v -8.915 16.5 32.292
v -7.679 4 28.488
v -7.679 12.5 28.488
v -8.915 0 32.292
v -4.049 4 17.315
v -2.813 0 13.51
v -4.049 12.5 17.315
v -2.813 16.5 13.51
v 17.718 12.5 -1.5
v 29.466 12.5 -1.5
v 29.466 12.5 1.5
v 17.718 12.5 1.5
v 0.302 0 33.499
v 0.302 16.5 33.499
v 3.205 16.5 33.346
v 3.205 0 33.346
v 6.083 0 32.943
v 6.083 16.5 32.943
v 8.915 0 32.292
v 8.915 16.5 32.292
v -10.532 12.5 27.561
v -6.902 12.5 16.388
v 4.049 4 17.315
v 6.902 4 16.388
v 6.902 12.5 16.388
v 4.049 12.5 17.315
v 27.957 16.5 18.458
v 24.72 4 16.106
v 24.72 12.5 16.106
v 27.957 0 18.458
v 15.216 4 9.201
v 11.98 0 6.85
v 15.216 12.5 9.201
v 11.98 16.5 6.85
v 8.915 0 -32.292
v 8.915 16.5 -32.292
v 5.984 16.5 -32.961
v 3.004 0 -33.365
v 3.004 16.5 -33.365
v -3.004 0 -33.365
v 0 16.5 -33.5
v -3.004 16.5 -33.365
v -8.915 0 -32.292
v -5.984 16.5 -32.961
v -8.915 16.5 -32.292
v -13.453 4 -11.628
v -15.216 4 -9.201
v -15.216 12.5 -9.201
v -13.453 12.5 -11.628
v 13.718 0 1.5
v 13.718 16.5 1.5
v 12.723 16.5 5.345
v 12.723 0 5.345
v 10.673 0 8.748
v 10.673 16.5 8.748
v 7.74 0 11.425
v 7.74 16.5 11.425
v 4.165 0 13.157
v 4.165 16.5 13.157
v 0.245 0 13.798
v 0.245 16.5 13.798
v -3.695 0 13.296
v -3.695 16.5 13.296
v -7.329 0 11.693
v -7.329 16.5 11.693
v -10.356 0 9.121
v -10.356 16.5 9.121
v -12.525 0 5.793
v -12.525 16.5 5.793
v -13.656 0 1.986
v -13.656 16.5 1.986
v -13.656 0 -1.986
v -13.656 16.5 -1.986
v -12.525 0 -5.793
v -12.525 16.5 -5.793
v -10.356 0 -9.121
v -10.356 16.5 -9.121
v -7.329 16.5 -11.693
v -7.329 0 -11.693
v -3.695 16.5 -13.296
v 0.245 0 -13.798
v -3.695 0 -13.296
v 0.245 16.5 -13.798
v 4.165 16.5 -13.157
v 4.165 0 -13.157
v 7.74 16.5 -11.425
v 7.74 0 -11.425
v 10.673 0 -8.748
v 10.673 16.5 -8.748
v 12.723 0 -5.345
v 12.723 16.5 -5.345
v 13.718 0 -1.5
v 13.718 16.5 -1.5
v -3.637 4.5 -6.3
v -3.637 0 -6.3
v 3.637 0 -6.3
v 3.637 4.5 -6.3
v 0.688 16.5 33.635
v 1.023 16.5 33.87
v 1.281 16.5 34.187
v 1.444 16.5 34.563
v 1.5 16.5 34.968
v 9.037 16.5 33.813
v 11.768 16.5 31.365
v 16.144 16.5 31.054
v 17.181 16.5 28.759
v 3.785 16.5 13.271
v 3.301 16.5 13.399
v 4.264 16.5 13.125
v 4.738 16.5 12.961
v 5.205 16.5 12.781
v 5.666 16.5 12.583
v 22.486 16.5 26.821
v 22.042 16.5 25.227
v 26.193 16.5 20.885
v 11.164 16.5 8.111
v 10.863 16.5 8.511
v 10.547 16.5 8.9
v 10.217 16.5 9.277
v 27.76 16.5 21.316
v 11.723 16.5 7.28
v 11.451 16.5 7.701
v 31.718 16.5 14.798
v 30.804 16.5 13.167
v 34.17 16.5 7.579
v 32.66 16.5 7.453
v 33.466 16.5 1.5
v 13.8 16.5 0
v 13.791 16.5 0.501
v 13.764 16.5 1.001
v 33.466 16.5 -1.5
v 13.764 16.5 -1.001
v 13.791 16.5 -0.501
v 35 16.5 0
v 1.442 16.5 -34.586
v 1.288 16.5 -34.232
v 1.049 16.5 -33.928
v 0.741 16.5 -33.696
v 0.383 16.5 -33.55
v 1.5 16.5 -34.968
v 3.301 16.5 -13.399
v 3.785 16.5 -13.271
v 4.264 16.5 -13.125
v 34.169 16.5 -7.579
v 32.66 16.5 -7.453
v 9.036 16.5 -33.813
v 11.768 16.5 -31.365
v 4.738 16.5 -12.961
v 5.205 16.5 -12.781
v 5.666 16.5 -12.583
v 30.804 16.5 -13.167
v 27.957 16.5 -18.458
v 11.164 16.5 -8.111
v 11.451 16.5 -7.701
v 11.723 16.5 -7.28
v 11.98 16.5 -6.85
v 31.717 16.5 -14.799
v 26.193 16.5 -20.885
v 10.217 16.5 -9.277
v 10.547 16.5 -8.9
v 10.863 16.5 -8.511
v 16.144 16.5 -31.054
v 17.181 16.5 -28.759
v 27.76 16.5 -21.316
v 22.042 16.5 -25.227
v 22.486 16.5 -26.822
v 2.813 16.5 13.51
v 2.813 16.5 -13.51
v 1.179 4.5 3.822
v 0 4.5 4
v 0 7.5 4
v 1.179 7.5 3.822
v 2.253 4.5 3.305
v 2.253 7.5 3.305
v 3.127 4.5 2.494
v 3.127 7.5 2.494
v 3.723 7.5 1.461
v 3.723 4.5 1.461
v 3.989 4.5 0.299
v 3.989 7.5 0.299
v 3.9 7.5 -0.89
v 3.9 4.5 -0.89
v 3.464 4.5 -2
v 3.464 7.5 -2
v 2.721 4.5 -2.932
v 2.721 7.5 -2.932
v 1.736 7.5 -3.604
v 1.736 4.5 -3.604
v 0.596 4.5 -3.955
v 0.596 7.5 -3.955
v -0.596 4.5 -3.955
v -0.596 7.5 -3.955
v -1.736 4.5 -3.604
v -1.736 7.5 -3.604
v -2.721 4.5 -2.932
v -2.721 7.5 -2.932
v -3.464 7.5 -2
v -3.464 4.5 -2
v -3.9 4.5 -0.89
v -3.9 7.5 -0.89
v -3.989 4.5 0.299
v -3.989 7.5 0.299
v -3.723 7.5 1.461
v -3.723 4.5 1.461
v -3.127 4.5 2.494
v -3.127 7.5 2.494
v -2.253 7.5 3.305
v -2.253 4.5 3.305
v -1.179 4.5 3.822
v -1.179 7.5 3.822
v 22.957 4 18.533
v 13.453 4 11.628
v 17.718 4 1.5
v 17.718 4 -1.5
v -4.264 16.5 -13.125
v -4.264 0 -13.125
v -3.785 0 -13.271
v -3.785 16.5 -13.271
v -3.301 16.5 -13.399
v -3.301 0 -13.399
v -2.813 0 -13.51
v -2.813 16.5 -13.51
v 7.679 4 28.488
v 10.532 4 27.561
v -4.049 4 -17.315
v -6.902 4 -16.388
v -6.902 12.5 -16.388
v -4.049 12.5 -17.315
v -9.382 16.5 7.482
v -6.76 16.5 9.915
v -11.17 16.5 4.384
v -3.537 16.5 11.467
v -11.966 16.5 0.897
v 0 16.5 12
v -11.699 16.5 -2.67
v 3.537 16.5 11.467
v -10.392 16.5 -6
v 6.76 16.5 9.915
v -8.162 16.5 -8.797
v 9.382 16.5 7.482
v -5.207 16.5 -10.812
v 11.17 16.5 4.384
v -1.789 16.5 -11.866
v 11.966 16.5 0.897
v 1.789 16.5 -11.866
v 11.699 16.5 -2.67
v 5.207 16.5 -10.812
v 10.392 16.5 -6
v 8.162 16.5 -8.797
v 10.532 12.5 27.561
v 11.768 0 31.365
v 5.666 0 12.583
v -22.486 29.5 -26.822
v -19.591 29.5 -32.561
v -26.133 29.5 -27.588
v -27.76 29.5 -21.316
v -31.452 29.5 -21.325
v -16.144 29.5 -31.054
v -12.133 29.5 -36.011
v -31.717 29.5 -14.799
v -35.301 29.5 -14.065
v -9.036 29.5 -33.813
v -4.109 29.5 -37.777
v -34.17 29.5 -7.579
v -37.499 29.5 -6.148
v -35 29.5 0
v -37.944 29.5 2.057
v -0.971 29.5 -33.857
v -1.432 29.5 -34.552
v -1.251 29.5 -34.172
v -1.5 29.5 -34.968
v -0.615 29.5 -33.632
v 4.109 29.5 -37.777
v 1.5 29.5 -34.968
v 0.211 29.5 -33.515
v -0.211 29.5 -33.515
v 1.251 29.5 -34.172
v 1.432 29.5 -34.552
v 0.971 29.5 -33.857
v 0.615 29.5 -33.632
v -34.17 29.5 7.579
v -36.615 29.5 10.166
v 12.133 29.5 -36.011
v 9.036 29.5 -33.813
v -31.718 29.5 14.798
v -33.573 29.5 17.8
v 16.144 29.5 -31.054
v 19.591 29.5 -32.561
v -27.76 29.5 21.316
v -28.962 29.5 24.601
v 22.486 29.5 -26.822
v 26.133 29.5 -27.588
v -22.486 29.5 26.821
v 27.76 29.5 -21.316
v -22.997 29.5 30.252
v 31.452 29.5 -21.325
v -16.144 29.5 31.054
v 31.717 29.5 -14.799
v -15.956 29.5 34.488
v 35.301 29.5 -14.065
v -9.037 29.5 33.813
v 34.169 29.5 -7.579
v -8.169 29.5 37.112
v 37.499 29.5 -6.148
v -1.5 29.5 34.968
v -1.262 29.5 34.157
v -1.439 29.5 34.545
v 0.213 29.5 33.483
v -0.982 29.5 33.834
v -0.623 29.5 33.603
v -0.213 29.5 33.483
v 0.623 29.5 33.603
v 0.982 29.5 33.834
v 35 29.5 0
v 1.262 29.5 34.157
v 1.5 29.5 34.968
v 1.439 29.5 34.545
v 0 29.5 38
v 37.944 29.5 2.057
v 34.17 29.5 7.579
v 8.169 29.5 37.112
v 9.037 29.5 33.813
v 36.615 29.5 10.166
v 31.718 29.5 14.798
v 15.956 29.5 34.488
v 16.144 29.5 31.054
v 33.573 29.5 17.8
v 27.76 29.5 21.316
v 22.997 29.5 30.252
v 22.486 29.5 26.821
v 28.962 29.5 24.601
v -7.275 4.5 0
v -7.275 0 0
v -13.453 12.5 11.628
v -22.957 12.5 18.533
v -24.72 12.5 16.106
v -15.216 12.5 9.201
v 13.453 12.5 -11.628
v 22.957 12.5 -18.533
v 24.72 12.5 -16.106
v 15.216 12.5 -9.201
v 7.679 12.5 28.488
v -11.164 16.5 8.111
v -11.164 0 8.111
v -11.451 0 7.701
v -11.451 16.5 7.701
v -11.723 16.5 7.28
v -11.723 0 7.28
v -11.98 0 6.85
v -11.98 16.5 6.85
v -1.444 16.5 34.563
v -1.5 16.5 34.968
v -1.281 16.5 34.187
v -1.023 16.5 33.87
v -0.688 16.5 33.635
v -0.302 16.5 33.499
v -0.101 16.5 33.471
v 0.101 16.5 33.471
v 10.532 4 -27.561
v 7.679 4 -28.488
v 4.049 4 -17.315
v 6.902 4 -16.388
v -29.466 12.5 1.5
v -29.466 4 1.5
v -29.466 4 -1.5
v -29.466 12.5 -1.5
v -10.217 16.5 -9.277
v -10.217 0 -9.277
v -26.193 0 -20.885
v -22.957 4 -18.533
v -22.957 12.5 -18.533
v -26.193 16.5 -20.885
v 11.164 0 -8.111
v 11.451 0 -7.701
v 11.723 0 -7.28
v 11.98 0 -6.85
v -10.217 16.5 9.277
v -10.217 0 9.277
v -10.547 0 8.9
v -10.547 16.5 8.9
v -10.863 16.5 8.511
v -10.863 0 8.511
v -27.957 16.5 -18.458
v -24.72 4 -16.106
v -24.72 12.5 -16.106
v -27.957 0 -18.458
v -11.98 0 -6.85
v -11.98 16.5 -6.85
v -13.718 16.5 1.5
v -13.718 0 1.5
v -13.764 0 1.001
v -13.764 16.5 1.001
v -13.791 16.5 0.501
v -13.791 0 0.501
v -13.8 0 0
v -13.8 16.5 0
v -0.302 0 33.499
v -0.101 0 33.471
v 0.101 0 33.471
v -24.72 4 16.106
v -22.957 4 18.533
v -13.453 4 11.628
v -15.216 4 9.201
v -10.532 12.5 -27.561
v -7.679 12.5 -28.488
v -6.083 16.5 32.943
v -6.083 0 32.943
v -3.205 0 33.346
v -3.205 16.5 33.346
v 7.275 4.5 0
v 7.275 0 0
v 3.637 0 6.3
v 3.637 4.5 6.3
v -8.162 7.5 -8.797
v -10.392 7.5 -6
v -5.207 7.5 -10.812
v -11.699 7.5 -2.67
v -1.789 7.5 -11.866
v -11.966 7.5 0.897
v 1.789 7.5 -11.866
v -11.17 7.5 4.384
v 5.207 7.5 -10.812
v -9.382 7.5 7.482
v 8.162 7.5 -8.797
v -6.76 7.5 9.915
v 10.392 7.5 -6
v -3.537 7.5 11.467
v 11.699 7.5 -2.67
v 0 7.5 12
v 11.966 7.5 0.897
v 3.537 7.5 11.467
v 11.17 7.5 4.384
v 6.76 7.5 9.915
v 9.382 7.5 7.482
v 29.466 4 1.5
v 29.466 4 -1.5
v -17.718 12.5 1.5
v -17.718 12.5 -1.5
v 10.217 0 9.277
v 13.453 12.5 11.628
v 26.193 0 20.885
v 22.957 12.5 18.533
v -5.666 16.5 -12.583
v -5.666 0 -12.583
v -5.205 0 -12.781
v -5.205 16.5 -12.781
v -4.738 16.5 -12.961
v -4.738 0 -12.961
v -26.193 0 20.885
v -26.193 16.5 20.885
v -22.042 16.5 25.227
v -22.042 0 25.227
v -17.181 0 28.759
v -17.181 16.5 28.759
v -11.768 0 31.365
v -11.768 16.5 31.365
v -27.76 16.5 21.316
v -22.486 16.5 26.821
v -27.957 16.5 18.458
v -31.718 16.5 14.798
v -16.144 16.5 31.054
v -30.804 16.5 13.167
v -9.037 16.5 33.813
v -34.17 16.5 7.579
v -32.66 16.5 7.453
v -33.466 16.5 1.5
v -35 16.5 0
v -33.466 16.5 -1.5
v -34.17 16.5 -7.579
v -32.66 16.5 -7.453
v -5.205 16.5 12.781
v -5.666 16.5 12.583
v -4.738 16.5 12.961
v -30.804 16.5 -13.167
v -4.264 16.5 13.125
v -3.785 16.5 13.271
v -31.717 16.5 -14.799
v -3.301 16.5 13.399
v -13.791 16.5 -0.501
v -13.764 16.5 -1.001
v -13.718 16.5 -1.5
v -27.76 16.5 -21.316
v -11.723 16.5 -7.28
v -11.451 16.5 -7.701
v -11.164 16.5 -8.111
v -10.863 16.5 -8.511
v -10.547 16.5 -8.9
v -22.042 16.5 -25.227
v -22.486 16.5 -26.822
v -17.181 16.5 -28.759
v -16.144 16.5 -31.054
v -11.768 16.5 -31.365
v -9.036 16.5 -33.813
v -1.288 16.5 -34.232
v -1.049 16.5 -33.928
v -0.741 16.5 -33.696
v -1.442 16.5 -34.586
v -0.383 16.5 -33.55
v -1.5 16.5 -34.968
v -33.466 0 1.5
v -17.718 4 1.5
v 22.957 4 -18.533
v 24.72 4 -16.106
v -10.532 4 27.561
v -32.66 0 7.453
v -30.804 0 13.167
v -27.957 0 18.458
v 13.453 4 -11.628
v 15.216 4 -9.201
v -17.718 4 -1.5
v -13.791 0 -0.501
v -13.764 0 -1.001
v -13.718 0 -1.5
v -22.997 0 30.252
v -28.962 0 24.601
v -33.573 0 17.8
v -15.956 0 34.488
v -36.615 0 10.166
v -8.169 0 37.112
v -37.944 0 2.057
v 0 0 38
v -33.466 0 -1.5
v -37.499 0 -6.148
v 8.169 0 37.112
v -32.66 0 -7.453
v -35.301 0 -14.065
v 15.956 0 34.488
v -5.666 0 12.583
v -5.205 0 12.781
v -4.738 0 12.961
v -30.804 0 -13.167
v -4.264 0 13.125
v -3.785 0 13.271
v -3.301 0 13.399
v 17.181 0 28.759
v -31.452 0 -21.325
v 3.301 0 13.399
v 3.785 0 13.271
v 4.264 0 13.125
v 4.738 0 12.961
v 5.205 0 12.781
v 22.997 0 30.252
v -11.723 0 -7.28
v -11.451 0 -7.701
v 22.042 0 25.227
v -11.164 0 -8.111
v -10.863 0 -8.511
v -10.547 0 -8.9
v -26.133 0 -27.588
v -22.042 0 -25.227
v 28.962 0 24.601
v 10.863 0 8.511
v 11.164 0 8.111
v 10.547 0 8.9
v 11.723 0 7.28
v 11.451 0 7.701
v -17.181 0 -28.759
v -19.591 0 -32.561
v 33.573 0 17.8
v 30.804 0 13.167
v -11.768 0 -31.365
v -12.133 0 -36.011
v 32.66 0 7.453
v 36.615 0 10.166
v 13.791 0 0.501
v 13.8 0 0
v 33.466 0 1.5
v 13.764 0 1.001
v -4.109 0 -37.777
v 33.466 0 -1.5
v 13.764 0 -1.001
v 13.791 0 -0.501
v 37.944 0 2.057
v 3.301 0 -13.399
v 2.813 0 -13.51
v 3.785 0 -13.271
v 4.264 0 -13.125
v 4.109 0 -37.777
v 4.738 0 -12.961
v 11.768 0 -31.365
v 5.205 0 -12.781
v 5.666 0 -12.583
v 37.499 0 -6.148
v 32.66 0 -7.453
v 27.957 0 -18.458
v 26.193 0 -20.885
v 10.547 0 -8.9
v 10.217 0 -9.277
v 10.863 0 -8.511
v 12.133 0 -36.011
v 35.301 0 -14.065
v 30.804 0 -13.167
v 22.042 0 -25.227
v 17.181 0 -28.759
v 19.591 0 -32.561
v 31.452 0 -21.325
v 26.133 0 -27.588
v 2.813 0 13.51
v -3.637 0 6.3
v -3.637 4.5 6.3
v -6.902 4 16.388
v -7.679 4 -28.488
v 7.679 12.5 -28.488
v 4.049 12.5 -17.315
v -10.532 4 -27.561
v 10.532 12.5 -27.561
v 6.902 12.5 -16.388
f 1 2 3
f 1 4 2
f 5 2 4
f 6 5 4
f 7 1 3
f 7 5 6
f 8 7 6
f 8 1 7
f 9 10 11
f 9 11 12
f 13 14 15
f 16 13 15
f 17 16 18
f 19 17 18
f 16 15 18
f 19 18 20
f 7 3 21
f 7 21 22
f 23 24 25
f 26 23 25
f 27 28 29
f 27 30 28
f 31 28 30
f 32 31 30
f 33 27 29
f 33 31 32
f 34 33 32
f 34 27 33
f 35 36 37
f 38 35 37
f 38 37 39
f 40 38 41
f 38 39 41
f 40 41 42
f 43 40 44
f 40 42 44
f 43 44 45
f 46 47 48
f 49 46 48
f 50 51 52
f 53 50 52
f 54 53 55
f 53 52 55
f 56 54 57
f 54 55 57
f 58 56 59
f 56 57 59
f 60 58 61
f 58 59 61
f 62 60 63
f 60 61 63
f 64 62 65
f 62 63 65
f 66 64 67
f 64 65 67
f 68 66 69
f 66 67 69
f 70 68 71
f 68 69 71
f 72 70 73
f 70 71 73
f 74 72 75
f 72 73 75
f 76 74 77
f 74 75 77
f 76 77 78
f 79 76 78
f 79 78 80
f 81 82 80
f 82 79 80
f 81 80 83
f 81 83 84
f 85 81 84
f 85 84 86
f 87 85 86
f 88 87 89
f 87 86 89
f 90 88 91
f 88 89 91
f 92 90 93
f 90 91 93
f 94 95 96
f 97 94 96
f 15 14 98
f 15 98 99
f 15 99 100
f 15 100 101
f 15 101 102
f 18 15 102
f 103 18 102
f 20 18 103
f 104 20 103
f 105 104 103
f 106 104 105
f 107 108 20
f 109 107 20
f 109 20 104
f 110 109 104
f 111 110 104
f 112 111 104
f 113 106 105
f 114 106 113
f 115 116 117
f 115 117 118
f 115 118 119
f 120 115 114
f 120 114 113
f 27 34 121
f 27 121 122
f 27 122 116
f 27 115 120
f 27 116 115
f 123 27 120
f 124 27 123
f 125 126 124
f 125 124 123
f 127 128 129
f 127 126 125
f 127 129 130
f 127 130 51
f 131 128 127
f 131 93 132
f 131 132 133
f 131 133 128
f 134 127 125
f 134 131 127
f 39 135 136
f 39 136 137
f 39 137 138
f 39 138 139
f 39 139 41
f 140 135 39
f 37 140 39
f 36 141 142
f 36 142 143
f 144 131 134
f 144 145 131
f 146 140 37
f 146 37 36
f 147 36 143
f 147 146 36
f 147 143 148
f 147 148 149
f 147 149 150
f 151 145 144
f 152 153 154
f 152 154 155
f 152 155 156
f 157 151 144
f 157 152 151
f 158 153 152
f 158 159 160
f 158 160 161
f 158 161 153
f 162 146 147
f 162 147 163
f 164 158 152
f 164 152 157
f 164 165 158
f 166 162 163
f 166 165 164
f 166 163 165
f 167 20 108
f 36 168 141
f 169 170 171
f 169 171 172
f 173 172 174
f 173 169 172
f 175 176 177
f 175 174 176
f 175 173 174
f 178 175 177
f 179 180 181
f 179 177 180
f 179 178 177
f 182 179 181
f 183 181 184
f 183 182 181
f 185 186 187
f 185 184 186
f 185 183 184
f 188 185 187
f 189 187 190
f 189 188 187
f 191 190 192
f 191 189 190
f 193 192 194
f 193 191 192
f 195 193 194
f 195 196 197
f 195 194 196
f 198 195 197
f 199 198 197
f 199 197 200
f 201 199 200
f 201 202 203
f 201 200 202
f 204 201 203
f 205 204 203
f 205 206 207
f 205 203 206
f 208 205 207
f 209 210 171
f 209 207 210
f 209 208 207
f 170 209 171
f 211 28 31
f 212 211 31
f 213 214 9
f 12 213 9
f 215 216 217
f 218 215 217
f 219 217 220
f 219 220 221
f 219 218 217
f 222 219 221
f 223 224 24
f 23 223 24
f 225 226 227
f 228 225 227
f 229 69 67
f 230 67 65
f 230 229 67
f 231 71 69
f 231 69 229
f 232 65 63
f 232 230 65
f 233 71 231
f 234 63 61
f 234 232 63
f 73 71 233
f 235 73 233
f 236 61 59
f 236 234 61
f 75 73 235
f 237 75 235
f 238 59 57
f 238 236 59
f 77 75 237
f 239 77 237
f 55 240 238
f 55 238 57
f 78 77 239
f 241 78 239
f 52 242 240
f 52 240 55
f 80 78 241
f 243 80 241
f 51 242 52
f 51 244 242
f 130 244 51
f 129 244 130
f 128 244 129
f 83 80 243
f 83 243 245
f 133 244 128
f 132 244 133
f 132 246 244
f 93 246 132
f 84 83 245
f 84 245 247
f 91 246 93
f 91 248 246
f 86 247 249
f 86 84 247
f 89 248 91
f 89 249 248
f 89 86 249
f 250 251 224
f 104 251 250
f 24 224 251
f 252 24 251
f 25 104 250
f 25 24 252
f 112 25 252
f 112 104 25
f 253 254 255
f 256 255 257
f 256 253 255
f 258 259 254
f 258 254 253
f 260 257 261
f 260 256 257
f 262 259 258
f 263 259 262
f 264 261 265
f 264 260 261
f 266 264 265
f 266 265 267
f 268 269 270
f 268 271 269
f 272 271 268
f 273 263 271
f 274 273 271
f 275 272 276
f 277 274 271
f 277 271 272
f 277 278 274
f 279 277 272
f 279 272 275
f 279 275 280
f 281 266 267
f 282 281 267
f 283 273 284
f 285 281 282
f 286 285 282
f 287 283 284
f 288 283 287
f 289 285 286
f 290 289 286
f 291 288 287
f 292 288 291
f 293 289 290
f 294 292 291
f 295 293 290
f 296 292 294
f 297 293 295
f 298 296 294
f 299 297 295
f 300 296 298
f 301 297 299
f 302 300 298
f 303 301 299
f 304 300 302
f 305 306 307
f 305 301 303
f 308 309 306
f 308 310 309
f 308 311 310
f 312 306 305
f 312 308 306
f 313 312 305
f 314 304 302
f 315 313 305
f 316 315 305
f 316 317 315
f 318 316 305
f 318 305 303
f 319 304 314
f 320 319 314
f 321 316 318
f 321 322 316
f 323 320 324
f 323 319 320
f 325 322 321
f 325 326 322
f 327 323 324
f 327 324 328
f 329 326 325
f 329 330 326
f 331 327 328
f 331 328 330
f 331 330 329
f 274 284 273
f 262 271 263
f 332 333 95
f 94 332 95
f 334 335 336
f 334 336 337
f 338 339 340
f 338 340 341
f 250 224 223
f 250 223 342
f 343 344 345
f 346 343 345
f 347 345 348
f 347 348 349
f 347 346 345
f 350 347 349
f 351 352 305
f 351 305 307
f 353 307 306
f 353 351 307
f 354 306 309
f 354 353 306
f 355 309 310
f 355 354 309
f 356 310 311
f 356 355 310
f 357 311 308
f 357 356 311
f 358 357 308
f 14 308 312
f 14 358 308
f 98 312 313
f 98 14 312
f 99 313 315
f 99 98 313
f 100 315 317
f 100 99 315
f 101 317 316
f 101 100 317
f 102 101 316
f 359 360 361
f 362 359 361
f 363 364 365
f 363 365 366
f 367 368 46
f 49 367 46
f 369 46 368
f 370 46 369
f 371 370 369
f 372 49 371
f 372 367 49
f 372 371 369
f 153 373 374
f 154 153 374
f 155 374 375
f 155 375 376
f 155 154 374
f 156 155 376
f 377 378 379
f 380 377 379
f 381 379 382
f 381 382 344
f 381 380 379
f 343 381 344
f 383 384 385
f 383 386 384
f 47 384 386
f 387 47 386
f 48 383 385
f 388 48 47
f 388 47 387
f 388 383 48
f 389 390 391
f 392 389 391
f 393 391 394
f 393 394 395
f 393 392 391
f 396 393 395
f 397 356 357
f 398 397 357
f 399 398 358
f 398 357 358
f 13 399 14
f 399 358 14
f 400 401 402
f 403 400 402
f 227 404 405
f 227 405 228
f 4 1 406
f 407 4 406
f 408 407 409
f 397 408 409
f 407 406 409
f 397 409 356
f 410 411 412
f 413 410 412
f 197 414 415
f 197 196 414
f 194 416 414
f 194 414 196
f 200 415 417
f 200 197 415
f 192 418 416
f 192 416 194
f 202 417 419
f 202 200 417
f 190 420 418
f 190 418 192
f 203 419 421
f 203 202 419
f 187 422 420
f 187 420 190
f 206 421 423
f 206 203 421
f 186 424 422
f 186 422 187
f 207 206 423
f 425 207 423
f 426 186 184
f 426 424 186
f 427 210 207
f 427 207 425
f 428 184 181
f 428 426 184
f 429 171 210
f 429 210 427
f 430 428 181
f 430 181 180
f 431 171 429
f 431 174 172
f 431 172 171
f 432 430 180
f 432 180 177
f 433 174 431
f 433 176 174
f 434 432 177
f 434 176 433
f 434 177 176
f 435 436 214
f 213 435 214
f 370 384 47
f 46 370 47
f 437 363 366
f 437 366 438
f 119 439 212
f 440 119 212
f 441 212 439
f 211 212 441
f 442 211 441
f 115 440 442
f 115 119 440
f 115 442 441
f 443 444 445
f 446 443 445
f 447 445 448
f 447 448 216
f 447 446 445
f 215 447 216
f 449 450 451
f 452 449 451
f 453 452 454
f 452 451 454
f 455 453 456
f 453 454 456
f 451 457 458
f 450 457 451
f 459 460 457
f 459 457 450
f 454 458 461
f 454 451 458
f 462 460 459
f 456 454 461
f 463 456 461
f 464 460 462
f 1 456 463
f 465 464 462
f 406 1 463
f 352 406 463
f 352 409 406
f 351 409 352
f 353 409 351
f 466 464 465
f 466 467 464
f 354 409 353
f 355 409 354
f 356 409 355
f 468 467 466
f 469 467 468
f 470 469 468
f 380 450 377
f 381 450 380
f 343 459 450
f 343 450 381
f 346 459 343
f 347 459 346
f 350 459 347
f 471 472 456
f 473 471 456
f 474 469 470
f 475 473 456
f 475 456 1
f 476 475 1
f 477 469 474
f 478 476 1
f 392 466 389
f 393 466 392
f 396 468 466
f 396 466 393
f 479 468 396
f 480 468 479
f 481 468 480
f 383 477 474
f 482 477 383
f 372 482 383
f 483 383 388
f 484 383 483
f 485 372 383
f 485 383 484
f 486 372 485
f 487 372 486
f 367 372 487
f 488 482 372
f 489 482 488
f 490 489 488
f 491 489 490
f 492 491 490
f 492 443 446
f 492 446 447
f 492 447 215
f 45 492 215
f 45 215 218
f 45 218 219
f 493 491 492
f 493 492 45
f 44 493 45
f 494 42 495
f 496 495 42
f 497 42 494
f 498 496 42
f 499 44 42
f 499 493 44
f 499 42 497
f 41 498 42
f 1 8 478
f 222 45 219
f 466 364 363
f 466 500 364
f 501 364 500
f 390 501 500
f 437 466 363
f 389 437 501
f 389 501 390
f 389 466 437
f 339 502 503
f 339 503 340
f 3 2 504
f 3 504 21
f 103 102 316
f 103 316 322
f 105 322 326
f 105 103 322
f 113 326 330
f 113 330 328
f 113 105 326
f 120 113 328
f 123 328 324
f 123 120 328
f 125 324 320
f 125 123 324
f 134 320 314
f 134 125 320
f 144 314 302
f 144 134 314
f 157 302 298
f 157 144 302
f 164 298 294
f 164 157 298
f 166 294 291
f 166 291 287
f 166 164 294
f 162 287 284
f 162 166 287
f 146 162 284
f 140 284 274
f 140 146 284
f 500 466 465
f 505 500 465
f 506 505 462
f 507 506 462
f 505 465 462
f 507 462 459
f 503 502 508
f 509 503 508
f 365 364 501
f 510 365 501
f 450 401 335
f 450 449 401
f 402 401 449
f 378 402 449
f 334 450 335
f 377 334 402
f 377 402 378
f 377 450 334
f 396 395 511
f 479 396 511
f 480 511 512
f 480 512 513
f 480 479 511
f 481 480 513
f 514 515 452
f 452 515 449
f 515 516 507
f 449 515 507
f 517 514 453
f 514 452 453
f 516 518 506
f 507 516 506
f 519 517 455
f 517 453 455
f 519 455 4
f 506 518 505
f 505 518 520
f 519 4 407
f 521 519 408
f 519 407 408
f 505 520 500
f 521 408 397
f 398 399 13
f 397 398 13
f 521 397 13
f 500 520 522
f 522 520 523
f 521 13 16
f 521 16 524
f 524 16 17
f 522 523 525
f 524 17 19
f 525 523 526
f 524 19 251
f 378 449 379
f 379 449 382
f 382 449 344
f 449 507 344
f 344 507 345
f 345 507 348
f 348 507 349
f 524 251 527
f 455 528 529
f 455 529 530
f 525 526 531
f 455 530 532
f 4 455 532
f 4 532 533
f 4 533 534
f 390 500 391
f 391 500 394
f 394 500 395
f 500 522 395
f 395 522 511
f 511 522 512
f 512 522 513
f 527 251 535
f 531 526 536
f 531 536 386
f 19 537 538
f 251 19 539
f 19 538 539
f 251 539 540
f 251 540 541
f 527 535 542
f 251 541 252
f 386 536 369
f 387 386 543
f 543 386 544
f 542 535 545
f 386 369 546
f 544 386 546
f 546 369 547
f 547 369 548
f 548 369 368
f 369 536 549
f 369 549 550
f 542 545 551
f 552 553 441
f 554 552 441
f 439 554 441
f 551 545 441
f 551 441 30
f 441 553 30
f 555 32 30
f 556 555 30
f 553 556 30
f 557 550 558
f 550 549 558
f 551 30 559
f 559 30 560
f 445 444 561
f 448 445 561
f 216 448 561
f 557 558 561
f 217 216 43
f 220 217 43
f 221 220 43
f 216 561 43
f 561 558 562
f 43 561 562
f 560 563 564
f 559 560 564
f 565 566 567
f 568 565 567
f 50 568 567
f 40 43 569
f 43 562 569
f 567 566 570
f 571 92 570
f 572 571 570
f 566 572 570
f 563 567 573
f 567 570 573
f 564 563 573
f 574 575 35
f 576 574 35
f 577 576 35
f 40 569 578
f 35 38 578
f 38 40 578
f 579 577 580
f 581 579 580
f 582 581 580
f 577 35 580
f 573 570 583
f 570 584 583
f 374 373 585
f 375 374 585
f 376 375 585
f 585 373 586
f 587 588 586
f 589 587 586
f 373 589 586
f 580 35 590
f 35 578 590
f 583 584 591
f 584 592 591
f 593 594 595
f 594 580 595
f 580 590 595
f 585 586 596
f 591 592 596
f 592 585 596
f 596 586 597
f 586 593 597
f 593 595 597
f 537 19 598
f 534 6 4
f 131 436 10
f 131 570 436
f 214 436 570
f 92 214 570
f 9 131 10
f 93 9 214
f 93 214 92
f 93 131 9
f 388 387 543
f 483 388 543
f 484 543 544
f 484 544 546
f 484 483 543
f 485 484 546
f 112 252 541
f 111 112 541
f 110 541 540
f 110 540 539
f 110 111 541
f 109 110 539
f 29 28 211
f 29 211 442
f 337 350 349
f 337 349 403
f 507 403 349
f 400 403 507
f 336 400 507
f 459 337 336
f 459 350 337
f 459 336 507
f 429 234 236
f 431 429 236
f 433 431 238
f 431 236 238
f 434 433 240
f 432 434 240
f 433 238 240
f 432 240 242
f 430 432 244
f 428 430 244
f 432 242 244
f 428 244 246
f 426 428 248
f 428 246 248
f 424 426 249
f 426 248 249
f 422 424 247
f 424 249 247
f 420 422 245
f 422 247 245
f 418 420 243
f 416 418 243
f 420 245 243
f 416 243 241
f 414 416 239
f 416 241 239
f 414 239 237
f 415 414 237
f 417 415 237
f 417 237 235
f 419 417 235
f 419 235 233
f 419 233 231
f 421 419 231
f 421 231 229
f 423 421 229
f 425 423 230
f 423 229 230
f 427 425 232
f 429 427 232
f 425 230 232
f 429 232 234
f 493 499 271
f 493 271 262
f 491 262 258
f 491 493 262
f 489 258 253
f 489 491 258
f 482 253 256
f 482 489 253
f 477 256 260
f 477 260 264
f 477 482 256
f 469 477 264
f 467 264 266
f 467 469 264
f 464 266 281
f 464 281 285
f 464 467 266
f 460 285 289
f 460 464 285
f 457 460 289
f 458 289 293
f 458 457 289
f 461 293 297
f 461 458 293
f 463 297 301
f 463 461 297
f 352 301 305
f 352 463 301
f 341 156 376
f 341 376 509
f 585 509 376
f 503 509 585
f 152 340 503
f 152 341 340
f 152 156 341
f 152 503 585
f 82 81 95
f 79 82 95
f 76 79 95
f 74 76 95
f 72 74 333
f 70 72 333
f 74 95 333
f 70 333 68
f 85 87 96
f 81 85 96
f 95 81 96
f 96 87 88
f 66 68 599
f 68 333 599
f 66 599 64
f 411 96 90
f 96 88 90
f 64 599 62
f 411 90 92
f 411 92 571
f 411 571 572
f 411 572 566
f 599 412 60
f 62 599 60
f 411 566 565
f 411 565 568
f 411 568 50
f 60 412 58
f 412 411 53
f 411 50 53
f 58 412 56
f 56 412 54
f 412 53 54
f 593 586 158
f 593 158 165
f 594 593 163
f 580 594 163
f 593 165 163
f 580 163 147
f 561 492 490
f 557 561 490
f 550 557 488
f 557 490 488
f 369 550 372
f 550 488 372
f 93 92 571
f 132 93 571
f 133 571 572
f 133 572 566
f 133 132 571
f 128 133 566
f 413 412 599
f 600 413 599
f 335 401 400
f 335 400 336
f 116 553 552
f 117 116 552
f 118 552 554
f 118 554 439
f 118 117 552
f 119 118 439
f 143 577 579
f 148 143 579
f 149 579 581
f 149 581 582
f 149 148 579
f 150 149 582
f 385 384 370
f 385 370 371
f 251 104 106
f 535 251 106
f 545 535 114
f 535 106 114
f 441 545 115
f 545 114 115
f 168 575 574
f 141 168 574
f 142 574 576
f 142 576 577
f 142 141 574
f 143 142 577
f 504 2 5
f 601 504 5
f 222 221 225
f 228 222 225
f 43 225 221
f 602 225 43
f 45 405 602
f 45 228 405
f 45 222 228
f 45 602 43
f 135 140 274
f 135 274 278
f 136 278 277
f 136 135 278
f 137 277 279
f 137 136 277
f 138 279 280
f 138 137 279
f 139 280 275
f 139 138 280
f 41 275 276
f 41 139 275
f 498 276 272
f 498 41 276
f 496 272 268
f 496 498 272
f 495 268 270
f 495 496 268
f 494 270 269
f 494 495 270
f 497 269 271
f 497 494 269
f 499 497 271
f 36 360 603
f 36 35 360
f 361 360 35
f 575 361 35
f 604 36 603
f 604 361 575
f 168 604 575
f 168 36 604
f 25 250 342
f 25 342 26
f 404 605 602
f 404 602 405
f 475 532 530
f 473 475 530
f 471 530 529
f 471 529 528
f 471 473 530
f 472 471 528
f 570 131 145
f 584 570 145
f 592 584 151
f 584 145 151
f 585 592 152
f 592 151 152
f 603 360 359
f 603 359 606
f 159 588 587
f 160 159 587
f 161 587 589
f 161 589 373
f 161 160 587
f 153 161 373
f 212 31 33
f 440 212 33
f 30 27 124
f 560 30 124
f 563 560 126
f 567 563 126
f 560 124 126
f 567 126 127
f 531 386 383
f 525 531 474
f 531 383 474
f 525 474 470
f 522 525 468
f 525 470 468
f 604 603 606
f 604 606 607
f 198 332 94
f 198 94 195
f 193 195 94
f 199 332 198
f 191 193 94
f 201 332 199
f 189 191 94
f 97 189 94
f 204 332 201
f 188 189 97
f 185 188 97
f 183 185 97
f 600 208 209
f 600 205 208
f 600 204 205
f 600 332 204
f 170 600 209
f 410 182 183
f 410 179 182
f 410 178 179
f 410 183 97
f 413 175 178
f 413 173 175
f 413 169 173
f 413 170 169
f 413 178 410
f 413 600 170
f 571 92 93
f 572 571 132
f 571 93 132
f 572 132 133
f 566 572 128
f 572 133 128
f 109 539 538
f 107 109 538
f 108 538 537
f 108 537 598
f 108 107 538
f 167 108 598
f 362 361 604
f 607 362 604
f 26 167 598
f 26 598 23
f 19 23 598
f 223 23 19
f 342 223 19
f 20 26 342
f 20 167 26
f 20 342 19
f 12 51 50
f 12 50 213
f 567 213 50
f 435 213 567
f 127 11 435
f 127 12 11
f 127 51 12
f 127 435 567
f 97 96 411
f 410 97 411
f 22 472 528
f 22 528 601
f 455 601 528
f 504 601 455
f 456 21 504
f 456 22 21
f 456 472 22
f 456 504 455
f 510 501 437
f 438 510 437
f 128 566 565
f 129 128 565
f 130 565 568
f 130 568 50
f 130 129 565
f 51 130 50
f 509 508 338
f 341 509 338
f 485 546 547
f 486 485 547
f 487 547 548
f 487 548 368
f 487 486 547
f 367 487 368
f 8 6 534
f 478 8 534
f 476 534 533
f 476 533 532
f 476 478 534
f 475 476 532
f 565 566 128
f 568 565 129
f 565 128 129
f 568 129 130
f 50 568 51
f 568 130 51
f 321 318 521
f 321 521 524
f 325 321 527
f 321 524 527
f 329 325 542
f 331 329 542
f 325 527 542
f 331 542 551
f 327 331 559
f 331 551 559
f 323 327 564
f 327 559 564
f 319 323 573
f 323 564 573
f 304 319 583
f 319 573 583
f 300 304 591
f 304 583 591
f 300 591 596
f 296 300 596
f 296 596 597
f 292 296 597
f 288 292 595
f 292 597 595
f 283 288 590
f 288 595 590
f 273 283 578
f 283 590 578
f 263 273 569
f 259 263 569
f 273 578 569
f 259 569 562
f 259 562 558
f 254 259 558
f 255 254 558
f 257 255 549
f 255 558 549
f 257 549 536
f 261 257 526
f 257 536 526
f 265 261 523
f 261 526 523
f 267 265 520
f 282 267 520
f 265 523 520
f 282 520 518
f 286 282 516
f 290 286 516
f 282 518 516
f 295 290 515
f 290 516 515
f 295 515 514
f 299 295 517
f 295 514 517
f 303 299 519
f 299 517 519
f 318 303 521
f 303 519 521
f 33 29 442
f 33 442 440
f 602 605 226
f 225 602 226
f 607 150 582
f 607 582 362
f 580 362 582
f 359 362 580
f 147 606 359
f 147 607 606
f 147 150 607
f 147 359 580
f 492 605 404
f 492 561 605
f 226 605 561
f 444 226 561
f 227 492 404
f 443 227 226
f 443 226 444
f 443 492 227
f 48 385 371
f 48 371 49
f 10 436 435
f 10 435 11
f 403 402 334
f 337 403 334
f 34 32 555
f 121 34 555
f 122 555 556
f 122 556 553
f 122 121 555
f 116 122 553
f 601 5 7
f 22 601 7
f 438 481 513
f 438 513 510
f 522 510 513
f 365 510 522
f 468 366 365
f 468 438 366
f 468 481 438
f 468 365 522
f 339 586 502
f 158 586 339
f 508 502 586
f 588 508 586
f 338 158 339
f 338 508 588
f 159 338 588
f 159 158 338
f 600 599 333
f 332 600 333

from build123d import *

# Parameters (mm, degrees)
SKETCH1_R           = 4
BOSS_EXTRUDE1_DEPTH = 16.5
SKETCH1_3_R         = 38
BOSS_EXTRUDE2_DEPTH = 29.5
CUT_EXTRUDE1_DEPTH  = 4.5
SKETCH3_R           = 12
CUT_EXTRUDE2_DEPTH  = 9
CUT_EXTRUDE4_DEPTH  = 57.216100896
BOSS_EXTRUDE6_DEPTH = 16.5
SKETCH6_W           = 11.748165023
SKETCH6_H           = 8.5
CUT_EXTRUDE5_DEPTH  = 3
CIRPATTERN1_COUNT   = 10
CIRPATTERN1_2_COUNT = 10


with BuildPart() as part:
    # Sketch1 → Boss-Extrude1 (new body)
    with BuildSketch(Plane(origin=(0, 0, 0), x_dir=(1, 0, 0), z_dir=(0, 1, 0))):
        with BuildLine():
            ThreePointArc((1.5, -34.96784237), (35, 0.000172372), (1.499655573, 34.967857143))
            ThreePointArc((1.499655573, 34.967857143), (-1.1078e-05, 33.5), (-1.499656047, 34.967879293))
            ThreePointArc((-1.499656047, 34.967879293), (-35.00002215, 0.000172134), (-1.5, -34.96786454))
            ThreePointArc((-1.5, -34.96786454), (-1.1085e-05, -33.46784237), (1.5, -34.96784237))
        make_face()
        with Locations(Location((0, 0, 0), (0, 0, 270))):
            Circle(SKETCH1_R, mode=Mode.SUBTRACT)
    extrude(amount=BOSS_EXTRUDE1_DEPTH)

    # Sketch1<3> → Boss-Extrude2 (add)
    with BuildSketch(Plane(origin=(0, 0, 0), x_dir=(1, 0, 0), z_dir=(0, 1, 0))):
        with Locations(Location((0, 0, 0), (0, 0, 270))):
            Circle(SKETCH1_3_R)
        with BuildLine():
            ThreePointArc((1.5, -34.96784237), (35, 0.000172372), (1.499655573, 34.967857143))
            ThreePointArc((1.499655573, 34.967857143), (-1.1078e-05, 33.5), (-1.499656047, 34.967879293))
            ThreePointArc((-1.499656047, 34.967879293), (-35.00002215, 0.000172134), (-1.5, -34.96786454))
            ThreePointArc((-1.5, -34.96786454), (-1.1085e-05, -33.46784237), (1.5, -34.96784237))
        make_face(mode=Mode.SUBTRACT)
    extrude(amount=BOSS_EXTRUDE2_DEPTH)

    # Sketch2 → Cut-Extrude1 (cut)
    with BuildSketch(Plane.XZ):
        Polygon((-3.637306696, 6.3), (-7.274613392, 0), (-3.637306696, -6.3), (3.637306696, -6.3), (7.274613392, 0), (3.637306696, 6.3), align=None)
    extrude(amount=-CUT_EXTRUDE1_DEPTH, mode=Mode.SUBTRACT)

    # Sketch3 → Cut-Extrude2 (cut)
    with BuildSketch(Plane(origin=(0, 16.5, 0), x_dir=(1, 0, 0), z_dir=(0, 1, 0))):
        with Locations(Location((0, 0, 0), (0, 0, 270))):
            Circle(SKETCH3_R)
    extrude(amount=-CUT_EXTRUDE2_DEPTH, mode=Mode.SUBTRACT)

    # Sketch5 → Cut-Extrude4 (cut, through all)
    with BuildSketch(Plane(origin=(0, 16.5, 0), x_dir=(1, 0, 0), z_dir=(0, 1, 0))):
        with BuildLine():
            ThreePointArc((13.718236038, -1.5), (-13.8, 0), (13.718236038, 1.5))
            Line((13.718236038, 1.5), (33.466401061, 1.5))
            ThreePointArc((33.466401061, 1.5), (-24.107867464, 23.260712077), (-0.30237508, -33.498635335))
            ThreePointArc((-0.30237508, -33.498635335), (0, -33.46784237), (0.30237508, -33.498635335))
            ThreePointArc((0.30237508, -33.498635335), (23.260712077, -24.107867464), (33.466401061, -1.5))
            Line((33.466401061, -1.5), (13.718236038, -1.5))
        make_face()
        with BuildLine():
            ThreePointArc((13.718236038, 1.5), (13.779543848, 0.751113398), (13.8, 0))
            Line((13.8, 0), (33.5, 0))
            ThreePointArc((33.5, 0), (33.491599212, 0.750188125), (33.466401061, 1.5))
            Line((33.466401061, 1.5), (13.718236038, 1.5))
        make_face()
        with BuildLine():
            Line((33.5, 0), (13.8, 0))
            ThreePointArc((13.8, 0), (13.779543848, -0.751113398), (13.718236038, -1.5))
            Line((13.718236038, -1.5), (33.466401061, -1.5))
            ThreePointArc((33.466401061, -1.5), (33.491599212, -0.750188125), (33.5, 0))
        make_face()
    extrude(amount=-CUT_EXTRUDE4_DEPTH, mode=Mode.SUBTRACT)


with BuildPart() as cut_extrude4_piece_1:
    # of the separate pieces the step leaves, piece 1, a body of its own (cut_extrude4_pieces)
    add(part.part.solids().sort_by_distance((1.499655573, 16.5, -34.967857143))[0])

    # Sketch5<3> → Boss-Extrude6 (add)
    with BuildSketch(Plane(origin=(0, 16.5, 0), x_dir=(1, 0, 0), z_dir=(0, 1, 0))):
        with BuildLine():
            Line((33.5, 0), (13.8, 0))
            ThreePointArc((13.8, 0), (13.779543848, -0.751113398), (13.718236038, -1.5))
            Line((13.718236038, -1.5), (33.466401061, -1.5))
            ThreePointArc((33.466401061, -1.5), (33.491599212, -0.750188125), (33.5, 0))
        make_face()
        with BuildLine():
            ThreePointArc((13.718236038, 1.5), (13.779543848, 0.751113398), (13.8, 0))
            Line((13.8, 0), (33.5, 0))
            ThreePointArc((33.5, 0), (33.491599212, 0.750188125), (33.466401061, 1.5))
            Line((33.466401061, 1.5), (13.718236038, 1.5))
        make_face()
    boss_extrude6 = extrude(amount=-BOSS_EXTRUDE6_DEPTH)

    # Sketch6 → Cut-Extrude5 (cut)
    with BuildSketch(Plane(origin=(-0.880879479, 0, -1.5), x_dir=(-1, 0, 0), z_dir=(0, 0, -1))):
        with Locations((-24.473198029, 8.25)):
            Rectangle(SKETCH6_W, SKETCH6_H)
    cut_extrude5 = extrude(amount=-CUT_EXTRUDE5_DEPTH, mode=Mode.SUBTRACT)

    # CirPattern1: Boss-Extrude6 ×10 about axis
    cirpattern1_axis = Axis((0, 0, 0), (0, 1, 0))
    for i in range(1, CIRPATTERN1_COUNT):
        add(boss_extrude6.rotate(cirpattern1_axis, i * 360 / CIRPATTERN1_COUNT))

    # CirPattern1 2: Cut-Extrude5 ×10 about axis
    cirpattern1_2_axis = Axis((0, 0, 0), (0, 1, 0))
    for i in range(1, CIRPATTERN1_2_COUNT):
        add(cut_extrude5.rotate(cirpattern1_2_axis, i * 360 / CIRPATTERN1_2_COUNT), mode=Mode.SUBTRACT)


with BuildPart() as cut_extrude4_piece_2:
    # of the separate pieces the step leaves, piece 2, a body of its own (cut_extrude4_pieces)
    add(part.part.solids().sort_by_distance((0, 4.5, 4))[0])


solid = Compound([cut_extrude4_piece_1.part, cut_extrude4_piece_2.part])
